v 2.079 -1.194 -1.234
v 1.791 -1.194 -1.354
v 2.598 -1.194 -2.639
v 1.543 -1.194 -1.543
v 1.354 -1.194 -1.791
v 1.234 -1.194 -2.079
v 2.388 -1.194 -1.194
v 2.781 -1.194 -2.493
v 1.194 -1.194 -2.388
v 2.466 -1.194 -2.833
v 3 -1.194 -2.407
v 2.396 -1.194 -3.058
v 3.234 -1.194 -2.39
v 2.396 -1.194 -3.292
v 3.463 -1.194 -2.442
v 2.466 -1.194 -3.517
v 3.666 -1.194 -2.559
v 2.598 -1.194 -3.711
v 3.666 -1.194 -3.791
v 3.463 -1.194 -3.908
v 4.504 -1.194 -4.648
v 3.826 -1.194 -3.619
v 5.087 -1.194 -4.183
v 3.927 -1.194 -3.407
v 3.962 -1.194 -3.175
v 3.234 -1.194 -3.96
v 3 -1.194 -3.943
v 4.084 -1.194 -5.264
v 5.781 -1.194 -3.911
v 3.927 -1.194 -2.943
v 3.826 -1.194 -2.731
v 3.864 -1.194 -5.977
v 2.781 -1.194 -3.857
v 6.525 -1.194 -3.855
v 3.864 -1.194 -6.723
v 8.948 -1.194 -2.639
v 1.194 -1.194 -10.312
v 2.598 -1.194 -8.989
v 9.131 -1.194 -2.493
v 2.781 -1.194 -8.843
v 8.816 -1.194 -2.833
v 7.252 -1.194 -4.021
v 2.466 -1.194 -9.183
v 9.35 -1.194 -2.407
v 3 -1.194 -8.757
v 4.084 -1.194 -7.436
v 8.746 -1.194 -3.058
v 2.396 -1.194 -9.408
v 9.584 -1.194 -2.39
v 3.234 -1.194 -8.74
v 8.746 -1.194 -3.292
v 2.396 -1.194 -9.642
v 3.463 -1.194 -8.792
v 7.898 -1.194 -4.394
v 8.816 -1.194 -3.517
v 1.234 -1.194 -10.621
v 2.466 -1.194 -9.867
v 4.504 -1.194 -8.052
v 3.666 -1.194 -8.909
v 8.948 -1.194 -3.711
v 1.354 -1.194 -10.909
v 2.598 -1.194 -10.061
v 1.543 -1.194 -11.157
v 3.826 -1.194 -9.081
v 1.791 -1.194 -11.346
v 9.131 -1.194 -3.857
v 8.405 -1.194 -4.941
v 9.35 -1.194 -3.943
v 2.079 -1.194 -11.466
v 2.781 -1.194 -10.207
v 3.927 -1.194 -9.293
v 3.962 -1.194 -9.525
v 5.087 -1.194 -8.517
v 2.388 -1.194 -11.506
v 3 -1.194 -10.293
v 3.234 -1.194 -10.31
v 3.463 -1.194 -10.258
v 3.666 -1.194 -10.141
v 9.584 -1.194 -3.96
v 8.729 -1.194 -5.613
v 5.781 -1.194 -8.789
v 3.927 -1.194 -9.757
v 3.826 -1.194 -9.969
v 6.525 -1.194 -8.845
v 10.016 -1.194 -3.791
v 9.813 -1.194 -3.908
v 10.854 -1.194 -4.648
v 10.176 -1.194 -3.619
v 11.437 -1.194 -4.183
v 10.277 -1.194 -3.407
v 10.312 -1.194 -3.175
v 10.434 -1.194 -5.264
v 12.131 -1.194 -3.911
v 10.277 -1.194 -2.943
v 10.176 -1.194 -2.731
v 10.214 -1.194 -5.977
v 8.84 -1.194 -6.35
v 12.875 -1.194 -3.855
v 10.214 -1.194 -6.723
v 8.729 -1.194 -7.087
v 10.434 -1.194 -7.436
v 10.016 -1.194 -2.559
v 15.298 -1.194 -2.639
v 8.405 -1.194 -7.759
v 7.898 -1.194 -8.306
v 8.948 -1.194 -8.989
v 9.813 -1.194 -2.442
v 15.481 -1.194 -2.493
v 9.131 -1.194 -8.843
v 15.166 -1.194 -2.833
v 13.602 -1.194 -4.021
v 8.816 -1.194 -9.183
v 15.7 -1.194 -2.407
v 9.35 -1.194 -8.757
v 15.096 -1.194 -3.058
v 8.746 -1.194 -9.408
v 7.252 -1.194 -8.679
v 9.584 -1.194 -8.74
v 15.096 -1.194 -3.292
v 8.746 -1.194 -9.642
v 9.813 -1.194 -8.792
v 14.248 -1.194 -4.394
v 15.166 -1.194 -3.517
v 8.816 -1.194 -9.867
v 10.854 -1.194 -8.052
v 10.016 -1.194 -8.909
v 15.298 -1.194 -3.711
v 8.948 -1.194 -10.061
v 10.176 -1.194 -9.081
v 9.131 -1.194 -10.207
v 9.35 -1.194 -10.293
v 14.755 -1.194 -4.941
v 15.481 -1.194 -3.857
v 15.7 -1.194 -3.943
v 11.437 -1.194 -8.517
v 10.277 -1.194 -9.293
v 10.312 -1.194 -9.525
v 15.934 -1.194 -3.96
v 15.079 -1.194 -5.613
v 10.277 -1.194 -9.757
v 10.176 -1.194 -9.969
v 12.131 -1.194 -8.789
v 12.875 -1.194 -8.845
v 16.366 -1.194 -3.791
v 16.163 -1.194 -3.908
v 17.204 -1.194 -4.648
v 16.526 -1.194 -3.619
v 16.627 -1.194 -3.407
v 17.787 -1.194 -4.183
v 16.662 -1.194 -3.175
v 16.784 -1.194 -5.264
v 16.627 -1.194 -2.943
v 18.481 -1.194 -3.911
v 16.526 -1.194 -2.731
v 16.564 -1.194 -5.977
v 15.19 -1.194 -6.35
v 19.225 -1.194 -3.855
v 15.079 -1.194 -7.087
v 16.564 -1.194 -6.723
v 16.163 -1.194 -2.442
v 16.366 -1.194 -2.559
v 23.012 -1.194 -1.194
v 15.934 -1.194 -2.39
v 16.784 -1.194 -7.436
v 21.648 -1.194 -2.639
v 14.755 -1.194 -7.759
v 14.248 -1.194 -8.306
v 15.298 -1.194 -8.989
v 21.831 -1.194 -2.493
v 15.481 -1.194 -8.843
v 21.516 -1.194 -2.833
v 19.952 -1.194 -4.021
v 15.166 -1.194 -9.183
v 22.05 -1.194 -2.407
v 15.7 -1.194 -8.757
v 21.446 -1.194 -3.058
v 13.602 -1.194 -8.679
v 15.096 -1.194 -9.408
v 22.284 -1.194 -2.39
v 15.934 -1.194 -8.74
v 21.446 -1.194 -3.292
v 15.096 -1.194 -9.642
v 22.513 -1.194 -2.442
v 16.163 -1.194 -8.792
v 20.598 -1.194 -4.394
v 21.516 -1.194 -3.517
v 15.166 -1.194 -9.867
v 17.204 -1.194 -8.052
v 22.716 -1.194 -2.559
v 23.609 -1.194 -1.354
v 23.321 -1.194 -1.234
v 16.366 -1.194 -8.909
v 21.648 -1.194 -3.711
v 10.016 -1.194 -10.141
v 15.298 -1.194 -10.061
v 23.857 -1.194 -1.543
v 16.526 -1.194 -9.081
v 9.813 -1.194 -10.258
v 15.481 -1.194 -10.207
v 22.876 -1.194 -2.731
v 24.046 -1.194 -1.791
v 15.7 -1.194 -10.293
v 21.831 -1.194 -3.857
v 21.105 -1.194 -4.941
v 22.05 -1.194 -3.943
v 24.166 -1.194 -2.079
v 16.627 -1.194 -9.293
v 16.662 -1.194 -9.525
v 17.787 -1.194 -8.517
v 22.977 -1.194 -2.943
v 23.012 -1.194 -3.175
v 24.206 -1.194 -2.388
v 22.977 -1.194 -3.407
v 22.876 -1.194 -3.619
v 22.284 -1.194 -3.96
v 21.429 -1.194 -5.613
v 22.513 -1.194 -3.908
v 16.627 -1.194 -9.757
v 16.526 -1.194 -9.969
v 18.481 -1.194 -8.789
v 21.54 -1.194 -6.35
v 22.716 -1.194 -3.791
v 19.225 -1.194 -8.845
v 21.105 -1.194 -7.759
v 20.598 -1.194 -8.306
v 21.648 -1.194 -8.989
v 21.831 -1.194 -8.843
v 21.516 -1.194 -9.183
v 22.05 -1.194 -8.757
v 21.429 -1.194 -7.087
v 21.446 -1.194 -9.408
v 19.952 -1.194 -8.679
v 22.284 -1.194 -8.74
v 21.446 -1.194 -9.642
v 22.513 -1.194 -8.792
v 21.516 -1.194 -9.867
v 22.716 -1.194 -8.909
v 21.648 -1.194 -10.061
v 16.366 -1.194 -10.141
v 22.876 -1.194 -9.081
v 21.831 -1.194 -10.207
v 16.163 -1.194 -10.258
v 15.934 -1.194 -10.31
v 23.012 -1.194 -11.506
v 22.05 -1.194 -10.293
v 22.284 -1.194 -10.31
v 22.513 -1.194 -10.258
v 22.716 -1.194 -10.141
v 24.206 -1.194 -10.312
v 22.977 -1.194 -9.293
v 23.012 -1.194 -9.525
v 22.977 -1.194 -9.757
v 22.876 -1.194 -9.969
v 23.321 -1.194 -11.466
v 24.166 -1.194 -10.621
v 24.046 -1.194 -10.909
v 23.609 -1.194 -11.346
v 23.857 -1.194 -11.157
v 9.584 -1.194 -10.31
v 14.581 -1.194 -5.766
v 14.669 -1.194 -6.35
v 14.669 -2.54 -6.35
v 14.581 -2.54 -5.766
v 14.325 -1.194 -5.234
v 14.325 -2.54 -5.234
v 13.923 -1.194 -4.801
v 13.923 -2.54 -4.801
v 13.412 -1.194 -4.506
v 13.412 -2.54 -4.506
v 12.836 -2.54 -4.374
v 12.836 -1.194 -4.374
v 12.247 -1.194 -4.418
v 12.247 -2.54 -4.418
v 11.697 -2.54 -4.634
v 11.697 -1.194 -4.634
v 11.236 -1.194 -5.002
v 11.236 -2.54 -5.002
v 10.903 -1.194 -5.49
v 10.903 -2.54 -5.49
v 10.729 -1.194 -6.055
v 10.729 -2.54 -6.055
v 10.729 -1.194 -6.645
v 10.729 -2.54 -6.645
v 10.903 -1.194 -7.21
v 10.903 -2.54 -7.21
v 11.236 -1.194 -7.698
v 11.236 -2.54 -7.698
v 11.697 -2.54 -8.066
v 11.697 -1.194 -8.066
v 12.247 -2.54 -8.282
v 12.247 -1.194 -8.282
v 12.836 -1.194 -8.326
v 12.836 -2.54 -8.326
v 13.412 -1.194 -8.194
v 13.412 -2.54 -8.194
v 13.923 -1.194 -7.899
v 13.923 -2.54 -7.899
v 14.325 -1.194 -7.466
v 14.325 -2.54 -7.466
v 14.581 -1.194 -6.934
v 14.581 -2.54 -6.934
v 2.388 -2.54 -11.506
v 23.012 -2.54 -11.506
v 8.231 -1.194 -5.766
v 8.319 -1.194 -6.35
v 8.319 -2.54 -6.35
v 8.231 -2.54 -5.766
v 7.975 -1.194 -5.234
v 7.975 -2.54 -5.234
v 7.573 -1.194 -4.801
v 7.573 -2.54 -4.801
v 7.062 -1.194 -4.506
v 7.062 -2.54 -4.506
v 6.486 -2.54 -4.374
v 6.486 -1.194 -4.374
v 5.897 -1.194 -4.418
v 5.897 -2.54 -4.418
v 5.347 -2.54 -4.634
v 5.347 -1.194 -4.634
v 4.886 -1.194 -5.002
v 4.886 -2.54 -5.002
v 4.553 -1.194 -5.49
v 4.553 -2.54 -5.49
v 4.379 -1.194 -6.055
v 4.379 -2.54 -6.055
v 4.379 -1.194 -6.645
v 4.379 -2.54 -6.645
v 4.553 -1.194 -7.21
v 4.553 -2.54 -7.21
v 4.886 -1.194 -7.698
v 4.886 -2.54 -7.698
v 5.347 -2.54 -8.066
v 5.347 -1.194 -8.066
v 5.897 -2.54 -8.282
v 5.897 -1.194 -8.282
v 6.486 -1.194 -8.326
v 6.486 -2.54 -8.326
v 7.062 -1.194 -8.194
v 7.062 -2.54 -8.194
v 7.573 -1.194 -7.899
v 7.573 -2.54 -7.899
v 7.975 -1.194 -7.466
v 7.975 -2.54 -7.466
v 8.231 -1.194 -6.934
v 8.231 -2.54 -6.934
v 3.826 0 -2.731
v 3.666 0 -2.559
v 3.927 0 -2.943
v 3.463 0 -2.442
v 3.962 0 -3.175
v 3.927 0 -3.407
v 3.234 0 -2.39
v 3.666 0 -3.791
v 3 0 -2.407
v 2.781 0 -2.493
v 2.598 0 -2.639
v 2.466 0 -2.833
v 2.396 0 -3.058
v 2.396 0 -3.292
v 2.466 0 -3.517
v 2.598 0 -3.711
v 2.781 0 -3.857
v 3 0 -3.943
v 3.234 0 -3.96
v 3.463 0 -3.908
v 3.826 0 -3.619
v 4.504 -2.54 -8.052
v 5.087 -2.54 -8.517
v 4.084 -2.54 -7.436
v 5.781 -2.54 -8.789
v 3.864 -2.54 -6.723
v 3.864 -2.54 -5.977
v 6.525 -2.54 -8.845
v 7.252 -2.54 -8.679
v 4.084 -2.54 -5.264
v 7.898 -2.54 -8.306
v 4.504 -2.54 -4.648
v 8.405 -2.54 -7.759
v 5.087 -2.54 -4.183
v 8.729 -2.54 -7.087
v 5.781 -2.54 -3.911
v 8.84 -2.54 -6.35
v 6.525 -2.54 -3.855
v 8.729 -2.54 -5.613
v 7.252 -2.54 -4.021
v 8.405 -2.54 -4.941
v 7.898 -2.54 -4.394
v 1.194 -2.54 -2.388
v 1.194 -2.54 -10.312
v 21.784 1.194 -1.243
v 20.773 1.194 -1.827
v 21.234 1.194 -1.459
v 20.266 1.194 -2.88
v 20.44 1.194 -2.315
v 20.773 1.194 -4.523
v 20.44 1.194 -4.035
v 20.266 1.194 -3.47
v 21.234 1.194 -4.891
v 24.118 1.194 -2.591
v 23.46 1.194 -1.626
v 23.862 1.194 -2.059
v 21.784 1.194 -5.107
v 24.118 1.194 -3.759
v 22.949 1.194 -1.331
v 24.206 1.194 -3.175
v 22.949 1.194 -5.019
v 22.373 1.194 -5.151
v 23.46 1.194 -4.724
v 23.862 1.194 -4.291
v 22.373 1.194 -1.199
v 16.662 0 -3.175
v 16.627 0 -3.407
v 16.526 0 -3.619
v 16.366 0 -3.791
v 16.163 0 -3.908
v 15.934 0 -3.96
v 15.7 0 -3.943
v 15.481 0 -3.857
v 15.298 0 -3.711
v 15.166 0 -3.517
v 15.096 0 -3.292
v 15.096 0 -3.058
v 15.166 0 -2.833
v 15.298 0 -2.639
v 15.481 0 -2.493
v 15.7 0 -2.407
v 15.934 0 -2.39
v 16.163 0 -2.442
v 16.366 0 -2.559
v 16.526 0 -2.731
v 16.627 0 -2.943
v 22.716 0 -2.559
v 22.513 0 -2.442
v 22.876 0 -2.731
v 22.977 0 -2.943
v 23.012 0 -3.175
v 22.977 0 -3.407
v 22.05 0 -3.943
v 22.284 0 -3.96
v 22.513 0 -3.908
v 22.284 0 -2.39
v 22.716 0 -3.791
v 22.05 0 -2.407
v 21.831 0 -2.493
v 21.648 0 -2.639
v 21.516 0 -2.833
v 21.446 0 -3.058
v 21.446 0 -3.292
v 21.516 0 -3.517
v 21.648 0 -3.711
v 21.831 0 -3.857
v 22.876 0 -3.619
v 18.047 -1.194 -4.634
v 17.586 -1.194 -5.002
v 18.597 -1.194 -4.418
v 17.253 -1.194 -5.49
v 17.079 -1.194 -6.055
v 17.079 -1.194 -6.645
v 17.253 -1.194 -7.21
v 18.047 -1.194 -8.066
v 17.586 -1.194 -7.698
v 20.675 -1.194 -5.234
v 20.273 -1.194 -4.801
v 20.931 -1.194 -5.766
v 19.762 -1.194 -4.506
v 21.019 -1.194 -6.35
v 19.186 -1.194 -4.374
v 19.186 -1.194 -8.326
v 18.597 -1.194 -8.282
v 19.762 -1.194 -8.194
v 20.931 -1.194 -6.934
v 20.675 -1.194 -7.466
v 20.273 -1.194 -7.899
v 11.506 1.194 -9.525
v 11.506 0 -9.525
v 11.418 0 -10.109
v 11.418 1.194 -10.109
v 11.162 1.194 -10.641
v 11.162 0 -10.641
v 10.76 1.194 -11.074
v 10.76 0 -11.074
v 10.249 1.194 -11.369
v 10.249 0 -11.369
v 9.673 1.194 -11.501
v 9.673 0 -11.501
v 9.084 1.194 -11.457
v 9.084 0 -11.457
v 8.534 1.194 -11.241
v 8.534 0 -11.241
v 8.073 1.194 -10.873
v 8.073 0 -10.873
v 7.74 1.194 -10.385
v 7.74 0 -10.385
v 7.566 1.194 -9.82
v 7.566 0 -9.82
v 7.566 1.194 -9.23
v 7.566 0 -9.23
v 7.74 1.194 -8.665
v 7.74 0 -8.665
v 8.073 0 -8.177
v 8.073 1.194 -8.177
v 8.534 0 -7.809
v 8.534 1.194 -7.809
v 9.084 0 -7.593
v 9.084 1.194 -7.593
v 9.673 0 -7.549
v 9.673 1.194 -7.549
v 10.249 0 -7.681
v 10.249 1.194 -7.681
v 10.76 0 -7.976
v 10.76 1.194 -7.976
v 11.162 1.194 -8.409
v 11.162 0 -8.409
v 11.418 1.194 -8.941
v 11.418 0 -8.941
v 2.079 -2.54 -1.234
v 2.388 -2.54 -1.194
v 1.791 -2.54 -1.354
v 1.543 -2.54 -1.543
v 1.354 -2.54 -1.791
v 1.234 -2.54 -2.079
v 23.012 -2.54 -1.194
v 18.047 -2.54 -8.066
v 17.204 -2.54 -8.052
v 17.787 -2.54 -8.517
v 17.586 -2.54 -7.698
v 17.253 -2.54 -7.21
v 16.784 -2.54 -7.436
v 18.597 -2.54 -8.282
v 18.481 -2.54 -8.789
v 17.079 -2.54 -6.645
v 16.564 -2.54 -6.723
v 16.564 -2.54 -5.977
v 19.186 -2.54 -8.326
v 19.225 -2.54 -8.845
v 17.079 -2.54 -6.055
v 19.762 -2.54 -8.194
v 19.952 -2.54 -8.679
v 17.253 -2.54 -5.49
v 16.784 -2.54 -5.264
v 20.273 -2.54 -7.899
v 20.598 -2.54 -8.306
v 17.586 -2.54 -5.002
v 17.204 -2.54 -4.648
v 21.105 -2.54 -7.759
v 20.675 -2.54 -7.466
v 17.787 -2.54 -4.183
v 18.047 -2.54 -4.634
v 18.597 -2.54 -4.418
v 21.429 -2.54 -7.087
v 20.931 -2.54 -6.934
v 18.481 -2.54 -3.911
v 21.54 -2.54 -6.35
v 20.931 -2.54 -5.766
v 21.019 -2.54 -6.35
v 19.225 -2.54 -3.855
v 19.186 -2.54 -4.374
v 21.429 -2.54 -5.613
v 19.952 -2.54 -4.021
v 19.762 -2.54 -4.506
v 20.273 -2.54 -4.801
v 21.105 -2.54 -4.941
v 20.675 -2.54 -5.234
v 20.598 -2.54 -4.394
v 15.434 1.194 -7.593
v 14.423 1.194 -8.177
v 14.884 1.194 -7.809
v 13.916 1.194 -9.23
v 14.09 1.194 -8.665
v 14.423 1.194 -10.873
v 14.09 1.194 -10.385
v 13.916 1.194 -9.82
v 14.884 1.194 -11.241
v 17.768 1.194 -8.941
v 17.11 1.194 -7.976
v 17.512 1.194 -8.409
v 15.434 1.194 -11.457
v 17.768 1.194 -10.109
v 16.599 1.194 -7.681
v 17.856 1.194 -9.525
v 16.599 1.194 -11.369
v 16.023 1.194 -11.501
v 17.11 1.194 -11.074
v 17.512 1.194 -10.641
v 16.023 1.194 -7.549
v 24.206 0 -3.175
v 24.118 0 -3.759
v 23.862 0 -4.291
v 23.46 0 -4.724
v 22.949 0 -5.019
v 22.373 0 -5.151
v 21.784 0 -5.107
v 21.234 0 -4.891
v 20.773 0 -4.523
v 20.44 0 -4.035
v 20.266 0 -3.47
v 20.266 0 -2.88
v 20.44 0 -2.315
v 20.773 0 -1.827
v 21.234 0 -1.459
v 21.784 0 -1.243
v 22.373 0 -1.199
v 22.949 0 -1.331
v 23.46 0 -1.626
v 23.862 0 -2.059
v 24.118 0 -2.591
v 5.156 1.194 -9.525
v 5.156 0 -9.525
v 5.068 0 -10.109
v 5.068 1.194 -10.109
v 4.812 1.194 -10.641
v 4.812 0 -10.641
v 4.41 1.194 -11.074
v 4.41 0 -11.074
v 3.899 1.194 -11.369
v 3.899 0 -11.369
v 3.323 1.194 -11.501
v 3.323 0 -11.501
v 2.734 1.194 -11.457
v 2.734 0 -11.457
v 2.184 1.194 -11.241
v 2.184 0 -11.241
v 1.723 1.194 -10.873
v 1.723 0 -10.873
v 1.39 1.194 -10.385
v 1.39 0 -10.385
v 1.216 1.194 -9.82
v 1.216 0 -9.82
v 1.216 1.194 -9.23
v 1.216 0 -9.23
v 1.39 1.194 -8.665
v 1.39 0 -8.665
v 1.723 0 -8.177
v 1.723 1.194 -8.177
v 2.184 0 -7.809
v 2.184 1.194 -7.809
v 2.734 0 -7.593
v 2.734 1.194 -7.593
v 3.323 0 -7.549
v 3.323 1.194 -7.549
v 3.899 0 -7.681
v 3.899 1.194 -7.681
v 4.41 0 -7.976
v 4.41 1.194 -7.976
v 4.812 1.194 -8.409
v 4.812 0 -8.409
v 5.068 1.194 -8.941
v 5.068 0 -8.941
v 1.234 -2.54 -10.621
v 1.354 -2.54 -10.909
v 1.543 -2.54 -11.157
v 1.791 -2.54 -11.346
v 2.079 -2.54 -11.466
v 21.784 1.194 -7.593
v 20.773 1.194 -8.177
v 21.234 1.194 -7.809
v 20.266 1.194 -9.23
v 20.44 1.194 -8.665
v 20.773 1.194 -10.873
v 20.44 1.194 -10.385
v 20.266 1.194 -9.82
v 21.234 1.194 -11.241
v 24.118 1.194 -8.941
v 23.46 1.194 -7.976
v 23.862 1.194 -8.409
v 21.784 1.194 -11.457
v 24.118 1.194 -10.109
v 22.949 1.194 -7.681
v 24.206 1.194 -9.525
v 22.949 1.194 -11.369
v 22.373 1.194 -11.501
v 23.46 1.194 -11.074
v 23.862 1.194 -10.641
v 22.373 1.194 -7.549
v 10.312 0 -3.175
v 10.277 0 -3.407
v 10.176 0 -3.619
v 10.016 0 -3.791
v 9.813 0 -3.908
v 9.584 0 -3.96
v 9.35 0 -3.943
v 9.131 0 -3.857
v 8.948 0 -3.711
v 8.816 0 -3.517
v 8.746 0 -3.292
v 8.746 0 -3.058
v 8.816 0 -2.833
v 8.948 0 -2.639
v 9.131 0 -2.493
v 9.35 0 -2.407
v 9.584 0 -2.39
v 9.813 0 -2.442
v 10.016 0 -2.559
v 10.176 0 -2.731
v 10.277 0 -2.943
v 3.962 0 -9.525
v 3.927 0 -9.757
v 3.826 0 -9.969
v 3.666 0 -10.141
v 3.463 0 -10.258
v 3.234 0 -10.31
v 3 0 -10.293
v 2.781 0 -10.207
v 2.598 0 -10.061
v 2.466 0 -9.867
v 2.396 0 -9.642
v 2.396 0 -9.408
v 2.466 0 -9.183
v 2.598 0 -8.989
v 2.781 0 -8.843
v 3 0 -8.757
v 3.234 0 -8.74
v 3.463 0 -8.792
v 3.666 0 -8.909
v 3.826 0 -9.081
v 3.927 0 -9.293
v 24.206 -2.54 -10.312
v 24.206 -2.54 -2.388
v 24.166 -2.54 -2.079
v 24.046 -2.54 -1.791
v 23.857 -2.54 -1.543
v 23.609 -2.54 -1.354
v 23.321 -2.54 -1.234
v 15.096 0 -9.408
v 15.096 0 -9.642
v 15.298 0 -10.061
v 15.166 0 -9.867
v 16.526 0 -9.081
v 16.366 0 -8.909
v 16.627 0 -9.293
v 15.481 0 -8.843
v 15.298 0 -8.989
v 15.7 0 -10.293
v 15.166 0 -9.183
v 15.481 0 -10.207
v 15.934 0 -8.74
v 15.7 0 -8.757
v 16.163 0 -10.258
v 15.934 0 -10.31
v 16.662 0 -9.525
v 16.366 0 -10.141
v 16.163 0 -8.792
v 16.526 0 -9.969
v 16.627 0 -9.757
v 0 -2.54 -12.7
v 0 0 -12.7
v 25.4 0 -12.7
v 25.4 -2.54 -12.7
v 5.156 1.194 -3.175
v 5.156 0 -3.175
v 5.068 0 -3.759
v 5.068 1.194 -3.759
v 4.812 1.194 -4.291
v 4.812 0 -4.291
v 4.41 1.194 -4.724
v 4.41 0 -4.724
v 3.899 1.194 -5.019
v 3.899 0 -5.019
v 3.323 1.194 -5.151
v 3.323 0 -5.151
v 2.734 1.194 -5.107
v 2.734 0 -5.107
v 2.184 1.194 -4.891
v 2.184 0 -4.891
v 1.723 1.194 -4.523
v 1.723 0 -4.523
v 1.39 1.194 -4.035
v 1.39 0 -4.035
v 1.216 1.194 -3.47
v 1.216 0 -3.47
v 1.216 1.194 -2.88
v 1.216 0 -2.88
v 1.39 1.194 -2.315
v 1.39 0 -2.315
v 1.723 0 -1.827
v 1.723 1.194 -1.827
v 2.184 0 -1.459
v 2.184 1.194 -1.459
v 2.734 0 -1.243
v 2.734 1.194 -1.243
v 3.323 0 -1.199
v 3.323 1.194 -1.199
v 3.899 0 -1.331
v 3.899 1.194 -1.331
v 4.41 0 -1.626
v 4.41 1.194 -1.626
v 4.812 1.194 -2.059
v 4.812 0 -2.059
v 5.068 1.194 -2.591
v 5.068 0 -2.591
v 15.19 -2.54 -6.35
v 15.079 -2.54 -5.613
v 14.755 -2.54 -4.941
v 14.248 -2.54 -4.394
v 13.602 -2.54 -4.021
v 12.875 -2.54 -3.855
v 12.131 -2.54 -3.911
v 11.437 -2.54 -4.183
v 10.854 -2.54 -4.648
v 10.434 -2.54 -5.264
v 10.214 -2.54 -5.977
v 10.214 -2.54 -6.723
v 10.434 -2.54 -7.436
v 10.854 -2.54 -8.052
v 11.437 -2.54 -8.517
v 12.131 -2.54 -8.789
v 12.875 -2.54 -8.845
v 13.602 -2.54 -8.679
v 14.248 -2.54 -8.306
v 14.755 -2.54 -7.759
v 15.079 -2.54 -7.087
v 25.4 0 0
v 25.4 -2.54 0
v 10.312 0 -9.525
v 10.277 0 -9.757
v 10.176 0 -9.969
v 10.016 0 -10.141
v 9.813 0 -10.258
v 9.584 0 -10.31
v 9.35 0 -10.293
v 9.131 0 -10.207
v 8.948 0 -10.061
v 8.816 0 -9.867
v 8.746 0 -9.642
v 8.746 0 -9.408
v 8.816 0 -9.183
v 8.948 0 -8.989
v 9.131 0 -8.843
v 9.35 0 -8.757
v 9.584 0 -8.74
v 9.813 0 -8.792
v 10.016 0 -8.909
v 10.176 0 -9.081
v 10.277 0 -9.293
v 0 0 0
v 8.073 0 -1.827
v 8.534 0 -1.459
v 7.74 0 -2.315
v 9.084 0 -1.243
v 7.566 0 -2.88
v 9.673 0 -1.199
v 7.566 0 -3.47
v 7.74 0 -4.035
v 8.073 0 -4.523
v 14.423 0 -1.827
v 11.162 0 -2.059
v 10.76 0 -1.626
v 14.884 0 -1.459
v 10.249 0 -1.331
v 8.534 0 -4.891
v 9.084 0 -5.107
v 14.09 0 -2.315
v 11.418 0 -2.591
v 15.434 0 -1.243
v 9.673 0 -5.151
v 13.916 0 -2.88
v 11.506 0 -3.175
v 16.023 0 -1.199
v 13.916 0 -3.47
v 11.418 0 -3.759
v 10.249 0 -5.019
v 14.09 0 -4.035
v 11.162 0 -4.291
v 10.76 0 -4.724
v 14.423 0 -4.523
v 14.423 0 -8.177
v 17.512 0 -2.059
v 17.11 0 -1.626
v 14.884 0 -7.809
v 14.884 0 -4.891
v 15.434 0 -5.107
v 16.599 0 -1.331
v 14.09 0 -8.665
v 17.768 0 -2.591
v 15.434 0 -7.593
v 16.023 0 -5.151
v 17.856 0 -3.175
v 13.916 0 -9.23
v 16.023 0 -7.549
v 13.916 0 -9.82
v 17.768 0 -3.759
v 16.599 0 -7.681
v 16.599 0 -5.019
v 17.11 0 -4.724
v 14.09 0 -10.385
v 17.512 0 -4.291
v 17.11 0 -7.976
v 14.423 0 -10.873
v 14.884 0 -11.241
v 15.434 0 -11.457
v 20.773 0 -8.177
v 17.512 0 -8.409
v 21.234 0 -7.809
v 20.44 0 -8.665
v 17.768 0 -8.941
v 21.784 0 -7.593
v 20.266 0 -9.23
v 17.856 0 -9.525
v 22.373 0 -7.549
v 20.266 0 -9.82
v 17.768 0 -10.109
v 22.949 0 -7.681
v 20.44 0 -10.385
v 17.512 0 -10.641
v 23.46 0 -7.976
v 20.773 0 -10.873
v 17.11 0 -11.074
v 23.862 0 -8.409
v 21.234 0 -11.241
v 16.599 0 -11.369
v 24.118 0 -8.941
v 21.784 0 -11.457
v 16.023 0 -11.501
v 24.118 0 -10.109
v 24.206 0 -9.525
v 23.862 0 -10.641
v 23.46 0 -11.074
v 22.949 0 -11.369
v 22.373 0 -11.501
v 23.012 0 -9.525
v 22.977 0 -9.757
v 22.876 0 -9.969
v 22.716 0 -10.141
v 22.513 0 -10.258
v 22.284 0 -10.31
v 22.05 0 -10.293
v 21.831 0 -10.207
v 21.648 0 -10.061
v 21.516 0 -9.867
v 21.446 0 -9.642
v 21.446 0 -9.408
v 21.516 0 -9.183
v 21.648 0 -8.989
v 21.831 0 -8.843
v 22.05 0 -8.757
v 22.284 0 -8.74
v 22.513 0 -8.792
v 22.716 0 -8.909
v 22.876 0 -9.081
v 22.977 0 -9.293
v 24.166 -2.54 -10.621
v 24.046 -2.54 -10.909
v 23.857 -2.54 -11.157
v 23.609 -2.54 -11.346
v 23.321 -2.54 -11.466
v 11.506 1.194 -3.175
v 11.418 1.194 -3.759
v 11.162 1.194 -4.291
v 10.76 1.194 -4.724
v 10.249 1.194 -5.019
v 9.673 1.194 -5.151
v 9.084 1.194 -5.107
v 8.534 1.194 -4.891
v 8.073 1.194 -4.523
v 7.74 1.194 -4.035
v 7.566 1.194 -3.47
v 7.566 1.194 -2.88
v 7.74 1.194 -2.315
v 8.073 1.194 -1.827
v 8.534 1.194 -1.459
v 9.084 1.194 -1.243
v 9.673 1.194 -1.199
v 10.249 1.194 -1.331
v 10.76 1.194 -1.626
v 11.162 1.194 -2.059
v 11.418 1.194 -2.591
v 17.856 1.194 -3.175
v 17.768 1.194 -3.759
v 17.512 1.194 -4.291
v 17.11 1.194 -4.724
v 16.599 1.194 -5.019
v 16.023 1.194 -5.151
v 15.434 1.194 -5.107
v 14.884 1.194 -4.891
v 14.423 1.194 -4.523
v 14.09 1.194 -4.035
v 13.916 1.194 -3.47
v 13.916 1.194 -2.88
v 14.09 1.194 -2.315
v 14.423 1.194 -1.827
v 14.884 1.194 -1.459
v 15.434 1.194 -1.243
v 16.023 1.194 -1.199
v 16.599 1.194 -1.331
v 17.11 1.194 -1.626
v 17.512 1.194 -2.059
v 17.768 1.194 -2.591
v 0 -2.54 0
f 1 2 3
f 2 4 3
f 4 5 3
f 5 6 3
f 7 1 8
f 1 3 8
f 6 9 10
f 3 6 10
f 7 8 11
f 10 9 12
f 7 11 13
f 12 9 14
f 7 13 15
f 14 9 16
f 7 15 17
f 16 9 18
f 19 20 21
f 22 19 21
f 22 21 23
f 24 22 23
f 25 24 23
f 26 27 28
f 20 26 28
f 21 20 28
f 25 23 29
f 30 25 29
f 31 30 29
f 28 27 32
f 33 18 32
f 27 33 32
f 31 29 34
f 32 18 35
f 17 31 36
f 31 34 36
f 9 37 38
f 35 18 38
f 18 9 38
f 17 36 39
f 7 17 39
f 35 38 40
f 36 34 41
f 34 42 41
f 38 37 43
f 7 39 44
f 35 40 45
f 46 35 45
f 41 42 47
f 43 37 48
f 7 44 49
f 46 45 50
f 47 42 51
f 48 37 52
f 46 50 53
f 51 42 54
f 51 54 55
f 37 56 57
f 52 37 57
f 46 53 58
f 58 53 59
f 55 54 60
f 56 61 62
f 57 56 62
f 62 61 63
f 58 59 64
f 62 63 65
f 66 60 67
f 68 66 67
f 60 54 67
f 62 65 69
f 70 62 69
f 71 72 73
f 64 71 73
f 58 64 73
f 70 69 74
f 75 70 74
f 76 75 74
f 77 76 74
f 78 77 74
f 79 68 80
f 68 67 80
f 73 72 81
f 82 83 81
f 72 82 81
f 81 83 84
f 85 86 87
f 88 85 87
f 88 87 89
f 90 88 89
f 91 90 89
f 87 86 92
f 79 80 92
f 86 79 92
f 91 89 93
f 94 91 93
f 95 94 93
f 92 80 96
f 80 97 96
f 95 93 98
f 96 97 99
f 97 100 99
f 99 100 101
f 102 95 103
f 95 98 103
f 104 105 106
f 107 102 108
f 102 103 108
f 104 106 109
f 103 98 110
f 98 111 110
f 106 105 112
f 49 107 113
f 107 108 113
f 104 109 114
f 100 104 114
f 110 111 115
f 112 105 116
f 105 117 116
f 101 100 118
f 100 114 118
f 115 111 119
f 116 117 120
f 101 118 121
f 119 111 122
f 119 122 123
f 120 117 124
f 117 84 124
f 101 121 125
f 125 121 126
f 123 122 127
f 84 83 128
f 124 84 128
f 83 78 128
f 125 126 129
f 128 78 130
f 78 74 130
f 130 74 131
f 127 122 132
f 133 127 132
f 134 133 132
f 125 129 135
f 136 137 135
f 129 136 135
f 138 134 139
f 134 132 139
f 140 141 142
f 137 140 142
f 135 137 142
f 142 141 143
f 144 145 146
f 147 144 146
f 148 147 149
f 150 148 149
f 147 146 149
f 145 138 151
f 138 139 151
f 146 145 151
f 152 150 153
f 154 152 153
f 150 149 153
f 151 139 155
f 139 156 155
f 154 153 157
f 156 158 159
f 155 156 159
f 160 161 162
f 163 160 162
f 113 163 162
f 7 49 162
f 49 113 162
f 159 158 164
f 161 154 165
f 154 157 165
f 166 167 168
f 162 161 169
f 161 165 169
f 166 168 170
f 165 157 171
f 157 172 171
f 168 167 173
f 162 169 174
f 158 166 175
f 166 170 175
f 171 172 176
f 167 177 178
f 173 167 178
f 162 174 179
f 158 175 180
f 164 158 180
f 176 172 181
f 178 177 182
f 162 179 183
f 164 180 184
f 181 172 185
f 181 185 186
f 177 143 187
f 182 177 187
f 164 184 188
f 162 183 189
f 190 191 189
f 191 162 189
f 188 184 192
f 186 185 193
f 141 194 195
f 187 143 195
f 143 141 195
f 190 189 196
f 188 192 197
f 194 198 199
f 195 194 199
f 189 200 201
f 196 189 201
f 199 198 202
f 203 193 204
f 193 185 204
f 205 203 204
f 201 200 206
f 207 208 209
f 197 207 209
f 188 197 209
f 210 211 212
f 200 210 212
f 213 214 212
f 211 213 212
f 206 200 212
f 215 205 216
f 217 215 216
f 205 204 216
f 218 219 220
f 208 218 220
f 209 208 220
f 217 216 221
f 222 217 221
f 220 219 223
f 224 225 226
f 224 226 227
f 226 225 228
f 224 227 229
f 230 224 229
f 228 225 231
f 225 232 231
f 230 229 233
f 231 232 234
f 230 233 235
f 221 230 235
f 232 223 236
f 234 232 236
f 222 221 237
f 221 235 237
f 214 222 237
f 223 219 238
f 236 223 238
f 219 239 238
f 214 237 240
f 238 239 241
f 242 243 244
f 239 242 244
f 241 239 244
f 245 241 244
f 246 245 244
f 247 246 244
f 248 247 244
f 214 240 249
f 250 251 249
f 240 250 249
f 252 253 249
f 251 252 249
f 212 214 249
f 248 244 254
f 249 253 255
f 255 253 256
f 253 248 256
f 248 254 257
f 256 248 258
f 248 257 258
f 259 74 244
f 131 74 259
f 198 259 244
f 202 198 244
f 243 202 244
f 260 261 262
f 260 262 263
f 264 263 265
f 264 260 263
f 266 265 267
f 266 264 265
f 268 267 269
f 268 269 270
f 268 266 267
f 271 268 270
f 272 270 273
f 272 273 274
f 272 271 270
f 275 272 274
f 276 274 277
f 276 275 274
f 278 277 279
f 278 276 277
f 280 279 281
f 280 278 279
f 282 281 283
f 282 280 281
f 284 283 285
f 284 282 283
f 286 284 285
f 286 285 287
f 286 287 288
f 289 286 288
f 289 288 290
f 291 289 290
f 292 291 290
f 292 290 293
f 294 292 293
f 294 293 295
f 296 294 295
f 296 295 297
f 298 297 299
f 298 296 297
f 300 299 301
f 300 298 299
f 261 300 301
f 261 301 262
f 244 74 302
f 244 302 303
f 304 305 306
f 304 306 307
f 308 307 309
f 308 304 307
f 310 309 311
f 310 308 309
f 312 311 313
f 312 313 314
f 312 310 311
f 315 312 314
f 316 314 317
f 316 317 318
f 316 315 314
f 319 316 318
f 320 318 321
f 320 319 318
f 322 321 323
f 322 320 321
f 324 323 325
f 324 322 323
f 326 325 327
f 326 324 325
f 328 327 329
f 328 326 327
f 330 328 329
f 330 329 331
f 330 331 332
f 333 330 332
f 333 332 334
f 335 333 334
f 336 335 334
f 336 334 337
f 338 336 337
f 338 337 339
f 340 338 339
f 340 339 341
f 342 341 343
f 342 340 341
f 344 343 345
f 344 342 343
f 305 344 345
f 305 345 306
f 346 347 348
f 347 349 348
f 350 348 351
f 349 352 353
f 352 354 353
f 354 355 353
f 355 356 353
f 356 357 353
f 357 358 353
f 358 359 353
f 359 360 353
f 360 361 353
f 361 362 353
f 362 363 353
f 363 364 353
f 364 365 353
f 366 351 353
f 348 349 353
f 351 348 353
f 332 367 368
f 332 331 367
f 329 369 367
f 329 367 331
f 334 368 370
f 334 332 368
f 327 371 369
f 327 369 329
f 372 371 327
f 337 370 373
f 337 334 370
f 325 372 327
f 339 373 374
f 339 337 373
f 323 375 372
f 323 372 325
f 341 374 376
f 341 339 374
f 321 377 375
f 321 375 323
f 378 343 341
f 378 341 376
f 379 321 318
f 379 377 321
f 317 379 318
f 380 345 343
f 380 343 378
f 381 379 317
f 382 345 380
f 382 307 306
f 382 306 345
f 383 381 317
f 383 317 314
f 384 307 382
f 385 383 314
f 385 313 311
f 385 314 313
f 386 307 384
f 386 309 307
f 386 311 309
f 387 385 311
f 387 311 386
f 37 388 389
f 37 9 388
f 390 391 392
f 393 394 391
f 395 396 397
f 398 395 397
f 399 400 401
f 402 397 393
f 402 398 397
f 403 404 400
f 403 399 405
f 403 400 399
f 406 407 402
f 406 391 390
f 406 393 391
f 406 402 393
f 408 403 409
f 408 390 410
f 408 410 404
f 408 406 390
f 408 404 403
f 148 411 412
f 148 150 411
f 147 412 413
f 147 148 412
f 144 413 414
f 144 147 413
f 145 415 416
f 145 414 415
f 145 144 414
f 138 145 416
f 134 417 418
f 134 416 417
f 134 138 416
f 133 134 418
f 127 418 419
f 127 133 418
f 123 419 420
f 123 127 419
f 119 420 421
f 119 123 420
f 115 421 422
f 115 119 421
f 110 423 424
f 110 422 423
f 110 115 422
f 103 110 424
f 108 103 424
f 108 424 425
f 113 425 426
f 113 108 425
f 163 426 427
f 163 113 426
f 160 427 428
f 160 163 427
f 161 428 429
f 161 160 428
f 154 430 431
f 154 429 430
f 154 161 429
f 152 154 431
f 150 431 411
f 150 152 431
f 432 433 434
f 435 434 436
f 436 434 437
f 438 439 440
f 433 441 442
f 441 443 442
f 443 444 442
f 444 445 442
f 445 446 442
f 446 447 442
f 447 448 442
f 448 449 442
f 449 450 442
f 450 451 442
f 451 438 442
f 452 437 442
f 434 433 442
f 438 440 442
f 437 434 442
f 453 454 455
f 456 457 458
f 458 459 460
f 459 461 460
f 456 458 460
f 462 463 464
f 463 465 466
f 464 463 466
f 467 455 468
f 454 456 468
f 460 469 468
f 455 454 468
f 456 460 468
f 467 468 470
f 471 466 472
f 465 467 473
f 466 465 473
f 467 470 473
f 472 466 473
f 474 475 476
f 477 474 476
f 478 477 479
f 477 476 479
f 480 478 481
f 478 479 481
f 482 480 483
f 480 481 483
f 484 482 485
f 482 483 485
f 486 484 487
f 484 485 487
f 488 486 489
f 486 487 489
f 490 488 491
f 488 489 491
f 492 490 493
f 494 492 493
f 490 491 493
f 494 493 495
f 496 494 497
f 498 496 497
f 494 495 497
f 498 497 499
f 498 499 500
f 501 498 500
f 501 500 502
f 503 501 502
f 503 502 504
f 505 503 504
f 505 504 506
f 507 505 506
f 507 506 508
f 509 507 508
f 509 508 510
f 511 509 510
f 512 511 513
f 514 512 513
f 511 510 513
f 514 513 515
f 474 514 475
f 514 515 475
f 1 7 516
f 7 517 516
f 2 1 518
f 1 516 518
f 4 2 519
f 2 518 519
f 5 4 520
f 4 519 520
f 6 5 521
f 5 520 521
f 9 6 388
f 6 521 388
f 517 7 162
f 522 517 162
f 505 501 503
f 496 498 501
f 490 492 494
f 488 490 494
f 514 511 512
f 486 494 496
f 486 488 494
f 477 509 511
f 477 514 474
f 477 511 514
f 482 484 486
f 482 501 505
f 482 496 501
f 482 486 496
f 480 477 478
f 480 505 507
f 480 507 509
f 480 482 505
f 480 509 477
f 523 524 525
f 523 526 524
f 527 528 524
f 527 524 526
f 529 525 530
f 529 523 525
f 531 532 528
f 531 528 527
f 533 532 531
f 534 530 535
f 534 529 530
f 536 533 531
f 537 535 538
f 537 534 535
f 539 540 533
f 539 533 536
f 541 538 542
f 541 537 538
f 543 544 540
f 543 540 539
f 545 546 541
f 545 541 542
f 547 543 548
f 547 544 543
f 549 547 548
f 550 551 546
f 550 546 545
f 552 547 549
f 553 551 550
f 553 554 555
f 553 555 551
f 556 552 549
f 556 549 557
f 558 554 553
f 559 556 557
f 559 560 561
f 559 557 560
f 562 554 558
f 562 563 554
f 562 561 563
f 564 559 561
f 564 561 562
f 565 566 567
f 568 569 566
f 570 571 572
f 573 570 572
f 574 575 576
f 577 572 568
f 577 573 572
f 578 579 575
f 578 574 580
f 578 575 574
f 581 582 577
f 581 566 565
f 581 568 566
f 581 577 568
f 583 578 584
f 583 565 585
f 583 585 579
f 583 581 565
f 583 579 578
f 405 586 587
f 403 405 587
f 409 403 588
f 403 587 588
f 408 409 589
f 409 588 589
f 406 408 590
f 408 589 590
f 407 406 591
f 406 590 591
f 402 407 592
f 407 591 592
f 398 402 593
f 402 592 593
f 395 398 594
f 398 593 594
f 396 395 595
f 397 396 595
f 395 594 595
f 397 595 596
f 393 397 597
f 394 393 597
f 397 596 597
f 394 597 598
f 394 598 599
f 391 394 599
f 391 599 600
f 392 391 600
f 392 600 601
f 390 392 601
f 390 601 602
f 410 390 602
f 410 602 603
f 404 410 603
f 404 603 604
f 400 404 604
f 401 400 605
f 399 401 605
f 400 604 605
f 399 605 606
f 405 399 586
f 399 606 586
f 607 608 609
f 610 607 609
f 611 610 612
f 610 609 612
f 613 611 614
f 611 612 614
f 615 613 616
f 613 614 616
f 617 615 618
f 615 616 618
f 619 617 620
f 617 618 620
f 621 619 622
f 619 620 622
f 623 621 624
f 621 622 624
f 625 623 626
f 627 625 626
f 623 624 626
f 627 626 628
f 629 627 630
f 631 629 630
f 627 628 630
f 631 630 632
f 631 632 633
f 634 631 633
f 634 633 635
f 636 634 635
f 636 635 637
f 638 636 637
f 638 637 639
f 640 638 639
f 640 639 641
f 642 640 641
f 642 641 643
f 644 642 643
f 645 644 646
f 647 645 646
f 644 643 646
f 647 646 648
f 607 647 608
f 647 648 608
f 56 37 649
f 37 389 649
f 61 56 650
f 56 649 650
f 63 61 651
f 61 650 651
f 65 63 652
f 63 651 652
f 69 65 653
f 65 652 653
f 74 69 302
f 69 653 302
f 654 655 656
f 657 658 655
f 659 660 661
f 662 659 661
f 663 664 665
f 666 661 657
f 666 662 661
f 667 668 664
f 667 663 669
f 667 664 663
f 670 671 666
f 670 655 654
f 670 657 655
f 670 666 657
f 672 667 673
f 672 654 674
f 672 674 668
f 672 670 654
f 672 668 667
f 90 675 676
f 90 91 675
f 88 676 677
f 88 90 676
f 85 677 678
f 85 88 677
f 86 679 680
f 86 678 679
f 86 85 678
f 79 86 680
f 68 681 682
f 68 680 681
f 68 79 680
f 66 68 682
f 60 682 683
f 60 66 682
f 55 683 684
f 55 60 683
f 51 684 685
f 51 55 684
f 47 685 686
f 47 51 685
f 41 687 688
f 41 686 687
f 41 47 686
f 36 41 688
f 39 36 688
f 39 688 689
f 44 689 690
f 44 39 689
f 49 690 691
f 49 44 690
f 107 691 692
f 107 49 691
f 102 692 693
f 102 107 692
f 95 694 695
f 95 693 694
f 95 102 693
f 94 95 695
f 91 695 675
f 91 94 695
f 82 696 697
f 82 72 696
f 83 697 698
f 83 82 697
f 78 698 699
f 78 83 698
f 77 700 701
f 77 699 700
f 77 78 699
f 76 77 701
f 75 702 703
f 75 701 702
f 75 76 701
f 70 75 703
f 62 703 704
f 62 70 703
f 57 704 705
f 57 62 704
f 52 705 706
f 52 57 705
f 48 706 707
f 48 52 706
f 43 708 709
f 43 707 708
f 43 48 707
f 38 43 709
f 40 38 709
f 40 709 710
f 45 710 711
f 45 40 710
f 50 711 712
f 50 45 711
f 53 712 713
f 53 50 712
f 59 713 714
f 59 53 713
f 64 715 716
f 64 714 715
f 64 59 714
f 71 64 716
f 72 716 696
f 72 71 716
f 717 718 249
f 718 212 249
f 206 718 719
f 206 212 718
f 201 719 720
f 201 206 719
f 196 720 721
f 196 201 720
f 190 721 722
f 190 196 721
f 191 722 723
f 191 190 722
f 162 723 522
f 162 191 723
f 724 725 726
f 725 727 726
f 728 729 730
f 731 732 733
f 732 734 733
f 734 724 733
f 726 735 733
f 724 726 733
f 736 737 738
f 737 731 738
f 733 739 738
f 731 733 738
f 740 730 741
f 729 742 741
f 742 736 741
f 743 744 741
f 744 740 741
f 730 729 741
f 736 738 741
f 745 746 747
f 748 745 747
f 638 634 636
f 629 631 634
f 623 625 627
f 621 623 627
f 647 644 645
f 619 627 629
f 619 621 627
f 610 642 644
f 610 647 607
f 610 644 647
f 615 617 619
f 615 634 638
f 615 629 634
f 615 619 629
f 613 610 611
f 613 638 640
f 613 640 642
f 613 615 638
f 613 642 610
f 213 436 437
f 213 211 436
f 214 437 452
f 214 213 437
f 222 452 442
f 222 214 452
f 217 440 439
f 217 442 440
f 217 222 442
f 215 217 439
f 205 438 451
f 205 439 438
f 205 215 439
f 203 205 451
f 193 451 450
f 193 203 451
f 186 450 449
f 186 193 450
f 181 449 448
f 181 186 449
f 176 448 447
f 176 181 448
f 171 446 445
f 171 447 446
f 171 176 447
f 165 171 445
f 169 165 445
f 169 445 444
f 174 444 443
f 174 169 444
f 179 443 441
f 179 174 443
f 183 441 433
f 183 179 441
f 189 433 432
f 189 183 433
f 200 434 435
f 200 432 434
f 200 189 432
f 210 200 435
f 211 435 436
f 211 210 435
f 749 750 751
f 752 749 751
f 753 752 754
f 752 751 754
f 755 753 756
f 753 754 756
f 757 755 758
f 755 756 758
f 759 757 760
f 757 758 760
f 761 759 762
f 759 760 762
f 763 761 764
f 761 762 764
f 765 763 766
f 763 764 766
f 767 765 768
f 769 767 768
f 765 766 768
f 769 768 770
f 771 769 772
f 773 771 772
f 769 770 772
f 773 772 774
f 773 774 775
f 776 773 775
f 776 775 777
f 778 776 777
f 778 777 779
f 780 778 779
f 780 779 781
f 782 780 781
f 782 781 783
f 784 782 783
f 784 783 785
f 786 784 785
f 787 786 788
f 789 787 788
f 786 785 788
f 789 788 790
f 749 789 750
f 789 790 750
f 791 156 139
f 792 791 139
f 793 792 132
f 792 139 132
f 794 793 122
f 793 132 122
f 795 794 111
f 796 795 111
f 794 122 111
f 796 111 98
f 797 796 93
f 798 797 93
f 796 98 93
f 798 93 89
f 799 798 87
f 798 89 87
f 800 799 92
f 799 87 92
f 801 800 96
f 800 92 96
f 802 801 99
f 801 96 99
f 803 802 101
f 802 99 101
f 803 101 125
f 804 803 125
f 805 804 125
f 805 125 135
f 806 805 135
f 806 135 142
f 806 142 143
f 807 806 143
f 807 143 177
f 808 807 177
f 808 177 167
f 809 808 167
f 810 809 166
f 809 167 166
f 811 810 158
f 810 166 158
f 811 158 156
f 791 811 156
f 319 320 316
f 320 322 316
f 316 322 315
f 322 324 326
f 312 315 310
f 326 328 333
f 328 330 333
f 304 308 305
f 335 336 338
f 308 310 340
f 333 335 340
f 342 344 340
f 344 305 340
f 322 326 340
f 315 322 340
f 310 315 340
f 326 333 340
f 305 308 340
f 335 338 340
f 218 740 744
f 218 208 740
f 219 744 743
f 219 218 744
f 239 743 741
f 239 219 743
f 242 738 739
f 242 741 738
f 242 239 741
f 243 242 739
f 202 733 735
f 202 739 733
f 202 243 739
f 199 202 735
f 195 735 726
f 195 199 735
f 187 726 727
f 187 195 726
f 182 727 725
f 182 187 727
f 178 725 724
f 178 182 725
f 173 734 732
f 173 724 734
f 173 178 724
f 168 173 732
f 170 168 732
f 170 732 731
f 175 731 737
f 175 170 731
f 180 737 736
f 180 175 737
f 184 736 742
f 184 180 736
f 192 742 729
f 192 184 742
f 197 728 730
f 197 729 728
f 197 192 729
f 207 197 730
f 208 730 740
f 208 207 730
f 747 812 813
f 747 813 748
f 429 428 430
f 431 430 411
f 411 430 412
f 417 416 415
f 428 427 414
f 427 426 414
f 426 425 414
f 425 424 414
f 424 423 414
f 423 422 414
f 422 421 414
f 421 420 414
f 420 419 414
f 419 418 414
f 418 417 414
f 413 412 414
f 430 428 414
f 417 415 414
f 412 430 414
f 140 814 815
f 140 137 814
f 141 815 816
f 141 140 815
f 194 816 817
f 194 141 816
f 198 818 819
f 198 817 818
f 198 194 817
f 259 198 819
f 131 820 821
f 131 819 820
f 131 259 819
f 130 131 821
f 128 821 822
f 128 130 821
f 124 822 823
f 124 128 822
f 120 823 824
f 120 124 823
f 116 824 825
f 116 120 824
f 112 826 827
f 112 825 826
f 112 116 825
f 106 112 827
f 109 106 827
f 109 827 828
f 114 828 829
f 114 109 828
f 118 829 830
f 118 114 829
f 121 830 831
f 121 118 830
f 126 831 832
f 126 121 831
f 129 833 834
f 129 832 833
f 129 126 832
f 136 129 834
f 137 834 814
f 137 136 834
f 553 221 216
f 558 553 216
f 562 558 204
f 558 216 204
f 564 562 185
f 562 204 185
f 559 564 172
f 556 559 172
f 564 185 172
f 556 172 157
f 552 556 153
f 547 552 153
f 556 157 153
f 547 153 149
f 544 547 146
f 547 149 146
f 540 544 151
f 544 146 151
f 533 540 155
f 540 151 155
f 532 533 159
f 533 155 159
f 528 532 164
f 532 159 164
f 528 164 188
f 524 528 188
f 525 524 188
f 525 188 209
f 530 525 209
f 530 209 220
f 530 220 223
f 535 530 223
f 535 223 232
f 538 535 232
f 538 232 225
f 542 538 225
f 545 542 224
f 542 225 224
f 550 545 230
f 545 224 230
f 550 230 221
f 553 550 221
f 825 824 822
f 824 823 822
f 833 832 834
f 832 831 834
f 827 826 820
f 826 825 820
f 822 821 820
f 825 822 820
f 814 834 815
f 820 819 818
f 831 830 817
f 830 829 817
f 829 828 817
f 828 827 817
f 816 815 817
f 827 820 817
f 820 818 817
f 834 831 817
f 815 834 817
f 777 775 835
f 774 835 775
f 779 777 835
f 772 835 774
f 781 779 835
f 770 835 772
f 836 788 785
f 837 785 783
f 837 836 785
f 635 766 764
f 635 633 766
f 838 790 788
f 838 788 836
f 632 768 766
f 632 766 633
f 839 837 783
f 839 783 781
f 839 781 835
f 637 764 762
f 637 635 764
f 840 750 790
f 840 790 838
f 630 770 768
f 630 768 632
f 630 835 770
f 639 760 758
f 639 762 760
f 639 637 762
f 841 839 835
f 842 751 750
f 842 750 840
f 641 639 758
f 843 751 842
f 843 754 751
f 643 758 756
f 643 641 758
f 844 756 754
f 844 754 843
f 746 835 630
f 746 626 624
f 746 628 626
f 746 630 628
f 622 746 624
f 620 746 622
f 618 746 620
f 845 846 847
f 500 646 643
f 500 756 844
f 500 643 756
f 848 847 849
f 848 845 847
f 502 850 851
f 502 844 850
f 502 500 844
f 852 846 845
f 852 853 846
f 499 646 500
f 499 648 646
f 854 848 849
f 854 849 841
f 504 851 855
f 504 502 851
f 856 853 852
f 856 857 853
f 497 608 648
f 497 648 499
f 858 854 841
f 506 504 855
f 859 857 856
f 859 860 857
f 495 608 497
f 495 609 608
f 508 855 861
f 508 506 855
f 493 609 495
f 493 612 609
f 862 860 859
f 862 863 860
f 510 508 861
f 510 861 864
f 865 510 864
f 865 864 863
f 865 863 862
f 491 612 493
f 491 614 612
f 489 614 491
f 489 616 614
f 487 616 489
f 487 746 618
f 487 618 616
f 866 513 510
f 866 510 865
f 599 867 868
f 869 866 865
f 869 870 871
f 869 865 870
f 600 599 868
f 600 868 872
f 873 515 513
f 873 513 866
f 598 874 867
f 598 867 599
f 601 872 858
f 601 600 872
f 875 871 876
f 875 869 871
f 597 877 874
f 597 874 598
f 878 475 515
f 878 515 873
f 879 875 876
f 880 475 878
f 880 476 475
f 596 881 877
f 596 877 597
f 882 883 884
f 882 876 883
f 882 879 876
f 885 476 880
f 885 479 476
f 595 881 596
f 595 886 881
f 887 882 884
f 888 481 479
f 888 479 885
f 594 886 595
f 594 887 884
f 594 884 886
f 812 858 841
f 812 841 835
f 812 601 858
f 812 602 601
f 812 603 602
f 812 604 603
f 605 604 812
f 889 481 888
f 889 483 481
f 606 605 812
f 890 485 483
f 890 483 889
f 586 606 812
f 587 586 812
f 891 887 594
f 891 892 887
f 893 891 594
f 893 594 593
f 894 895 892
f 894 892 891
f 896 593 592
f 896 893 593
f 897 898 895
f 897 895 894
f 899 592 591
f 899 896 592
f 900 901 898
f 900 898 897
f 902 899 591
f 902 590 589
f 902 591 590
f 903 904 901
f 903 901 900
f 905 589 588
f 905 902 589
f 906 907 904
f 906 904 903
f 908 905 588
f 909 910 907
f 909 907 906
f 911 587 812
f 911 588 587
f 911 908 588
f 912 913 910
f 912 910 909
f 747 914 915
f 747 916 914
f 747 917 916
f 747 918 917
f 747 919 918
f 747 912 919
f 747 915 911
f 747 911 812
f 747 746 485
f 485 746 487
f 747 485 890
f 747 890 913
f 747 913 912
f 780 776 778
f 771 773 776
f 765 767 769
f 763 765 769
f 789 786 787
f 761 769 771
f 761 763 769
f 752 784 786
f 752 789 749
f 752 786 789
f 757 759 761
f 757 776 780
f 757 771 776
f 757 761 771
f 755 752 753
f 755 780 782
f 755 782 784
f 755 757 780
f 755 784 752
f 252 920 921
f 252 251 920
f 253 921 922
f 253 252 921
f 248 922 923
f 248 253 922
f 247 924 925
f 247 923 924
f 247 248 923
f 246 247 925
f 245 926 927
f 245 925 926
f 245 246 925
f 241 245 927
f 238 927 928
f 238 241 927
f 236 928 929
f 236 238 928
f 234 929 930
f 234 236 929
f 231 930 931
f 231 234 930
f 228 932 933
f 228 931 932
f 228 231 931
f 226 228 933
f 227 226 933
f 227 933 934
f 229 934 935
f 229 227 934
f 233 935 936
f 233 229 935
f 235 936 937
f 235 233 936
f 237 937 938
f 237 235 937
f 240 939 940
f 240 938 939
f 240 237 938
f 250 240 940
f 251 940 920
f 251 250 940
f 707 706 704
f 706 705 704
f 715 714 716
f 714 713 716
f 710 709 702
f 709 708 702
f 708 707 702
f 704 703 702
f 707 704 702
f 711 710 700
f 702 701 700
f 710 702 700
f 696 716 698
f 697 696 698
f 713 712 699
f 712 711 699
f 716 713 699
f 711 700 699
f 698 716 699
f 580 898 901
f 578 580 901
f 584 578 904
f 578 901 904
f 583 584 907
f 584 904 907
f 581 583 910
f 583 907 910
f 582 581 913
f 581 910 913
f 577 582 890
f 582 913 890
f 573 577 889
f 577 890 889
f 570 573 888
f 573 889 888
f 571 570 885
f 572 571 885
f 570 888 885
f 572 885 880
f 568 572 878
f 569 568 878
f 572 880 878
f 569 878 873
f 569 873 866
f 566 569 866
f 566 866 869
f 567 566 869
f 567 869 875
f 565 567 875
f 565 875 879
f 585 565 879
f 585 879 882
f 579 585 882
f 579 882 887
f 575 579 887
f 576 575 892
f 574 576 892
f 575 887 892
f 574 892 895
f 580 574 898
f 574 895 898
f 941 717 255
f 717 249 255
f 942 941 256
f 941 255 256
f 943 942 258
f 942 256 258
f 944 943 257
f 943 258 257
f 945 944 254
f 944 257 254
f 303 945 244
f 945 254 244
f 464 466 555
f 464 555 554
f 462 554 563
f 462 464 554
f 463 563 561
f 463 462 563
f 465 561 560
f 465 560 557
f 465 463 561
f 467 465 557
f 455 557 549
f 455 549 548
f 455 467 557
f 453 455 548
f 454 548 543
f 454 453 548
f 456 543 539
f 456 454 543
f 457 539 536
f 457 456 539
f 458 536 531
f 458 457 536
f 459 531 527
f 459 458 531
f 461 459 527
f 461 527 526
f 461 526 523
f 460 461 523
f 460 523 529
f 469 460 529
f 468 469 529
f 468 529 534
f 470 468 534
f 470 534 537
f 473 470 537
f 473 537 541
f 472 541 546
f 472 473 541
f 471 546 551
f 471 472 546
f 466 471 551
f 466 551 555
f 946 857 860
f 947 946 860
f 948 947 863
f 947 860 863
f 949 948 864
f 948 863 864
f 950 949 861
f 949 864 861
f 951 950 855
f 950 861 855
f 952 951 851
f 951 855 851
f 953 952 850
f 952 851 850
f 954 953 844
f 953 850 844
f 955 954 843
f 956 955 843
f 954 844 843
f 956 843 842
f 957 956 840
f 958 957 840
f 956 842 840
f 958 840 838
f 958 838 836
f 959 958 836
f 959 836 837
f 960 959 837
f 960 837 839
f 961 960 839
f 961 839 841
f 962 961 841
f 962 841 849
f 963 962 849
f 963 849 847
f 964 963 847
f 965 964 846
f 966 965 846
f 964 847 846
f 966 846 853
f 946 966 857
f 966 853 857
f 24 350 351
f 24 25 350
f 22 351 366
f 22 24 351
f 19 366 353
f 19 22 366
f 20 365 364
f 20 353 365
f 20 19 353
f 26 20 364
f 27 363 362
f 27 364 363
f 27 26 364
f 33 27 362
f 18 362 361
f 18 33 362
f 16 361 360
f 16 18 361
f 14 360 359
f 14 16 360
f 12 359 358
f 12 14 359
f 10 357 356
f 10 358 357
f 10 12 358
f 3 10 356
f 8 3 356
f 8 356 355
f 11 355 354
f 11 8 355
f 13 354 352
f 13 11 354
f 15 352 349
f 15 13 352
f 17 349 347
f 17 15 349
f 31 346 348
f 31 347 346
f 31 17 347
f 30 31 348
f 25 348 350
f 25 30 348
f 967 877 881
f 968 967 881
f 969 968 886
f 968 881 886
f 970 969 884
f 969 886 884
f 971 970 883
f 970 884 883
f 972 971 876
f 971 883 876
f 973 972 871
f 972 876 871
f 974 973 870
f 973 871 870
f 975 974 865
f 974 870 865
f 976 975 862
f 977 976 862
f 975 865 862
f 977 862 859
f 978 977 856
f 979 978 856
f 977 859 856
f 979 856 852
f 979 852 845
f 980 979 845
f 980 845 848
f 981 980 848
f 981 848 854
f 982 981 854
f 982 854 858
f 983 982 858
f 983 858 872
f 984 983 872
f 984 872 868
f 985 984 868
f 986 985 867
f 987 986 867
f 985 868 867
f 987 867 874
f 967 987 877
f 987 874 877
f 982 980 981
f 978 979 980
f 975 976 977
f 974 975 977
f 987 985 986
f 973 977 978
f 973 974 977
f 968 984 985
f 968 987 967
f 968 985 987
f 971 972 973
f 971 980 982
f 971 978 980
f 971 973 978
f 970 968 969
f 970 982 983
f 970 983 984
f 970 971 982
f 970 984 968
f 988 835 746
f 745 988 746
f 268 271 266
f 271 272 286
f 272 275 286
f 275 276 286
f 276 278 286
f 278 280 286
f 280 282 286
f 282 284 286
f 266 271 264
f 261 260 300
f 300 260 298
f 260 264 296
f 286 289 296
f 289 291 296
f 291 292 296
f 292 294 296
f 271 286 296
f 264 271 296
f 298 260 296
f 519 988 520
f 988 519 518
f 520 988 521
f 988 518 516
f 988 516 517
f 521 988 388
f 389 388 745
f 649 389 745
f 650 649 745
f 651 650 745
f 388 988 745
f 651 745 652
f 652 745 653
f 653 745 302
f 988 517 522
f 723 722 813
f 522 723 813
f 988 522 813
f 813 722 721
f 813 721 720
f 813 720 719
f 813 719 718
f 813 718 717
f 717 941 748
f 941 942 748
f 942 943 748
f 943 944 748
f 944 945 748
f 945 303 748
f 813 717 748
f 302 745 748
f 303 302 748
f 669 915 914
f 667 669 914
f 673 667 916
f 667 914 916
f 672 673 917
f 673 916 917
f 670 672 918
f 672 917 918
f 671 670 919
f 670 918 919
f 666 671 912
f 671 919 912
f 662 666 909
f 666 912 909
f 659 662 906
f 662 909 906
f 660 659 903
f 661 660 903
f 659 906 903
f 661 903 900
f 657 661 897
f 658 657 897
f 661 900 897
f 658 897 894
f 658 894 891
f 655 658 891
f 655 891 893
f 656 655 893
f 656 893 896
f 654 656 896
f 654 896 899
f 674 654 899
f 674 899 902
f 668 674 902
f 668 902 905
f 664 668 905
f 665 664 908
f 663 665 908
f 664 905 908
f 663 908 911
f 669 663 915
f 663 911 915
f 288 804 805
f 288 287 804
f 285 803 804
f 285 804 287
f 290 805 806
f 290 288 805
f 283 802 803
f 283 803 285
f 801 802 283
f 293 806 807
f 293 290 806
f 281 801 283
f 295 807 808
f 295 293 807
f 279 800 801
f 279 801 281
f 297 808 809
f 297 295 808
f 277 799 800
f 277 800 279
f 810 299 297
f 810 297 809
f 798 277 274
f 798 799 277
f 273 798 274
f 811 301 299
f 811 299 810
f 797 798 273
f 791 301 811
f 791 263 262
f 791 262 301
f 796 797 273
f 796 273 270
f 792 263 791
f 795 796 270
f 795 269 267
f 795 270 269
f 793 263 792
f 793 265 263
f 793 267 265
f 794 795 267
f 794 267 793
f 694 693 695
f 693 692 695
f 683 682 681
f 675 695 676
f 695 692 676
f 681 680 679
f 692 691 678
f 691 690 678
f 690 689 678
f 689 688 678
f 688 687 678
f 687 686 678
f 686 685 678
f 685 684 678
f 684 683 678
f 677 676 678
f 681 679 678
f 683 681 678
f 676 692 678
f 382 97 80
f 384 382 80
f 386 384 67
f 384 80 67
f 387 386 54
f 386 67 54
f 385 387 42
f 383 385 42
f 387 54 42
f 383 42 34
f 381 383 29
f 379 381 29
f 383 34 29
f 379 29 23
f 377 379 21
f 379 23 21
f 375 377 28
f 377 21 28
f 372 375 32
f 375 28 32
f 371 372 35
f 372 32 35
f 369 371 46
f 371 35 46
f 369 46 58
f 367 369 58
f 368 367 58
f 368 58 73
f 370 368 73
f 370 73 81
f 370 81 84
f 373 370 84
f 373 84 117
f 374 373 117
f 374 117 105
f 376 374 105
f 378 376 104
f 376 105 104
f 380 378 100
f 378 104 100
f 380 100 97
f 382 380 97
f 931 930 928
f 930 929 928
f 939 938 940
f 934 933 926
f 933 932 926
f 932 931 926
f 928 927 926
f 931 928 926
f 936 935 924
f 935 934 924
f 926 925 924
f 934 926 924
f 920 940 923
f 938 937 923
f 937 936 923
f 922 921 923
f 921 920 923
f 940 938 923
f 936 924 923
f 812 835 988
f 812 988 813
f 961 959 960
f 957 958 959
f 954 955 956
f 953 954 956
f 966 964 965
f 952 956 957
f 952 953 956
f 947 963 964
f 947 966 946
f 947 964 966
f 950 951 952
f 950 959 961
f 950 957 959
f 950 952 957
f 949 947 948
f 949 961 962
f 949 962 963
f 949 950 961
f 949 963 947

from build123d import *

# Parameters (mm, degrees)
SKETCH1_W            = 25.4
SKETCH1_H            = 12.7
BOSS_EXTRUDE1_DEPTH  = 2.54
SKETCH1_3_R          = 1.9812
BOSS_EXTRUDE2_DEPTH  = 1.1938
LPATTERN1_COUNT      = 4
LPATTERN1_PITCH      = 6.35
LPATTERN1_COUNT_DIR2 = 2
LPATTERN1_PITCH_DIR2 = 6.35
SHELL1_T             = -1.1938
SKETCH2_R            = 2.5019
SKETCH2_R_2          = 1.9812
BOSS_EXTRUDE3_DEPTH  = 1.3462
LPATTERN2_COUNT      = 3
LPATTERN2_PITCH      = 6.35
FILLET1_R            = 1.1938


with BuildPart() as part:
    # Sketch1 → Boss-Extrude1 (new body)
    with BuildSketch(Plane(origin=(0, 0, 0), x_dir=(1, 0, 0), z_dir=(0, 1, 0))):
        with Locations((12.7, 6.35)):
            Rectangle(SKETCH1_W, SKETCH1_H)
    extrude(amount=-BOSS_EXTRUDE1_DEPTH)

    # Sketch1<3> → Boss-Extrude2 (add)
    with BuildSketch(Plane(origin=(0, 0, 0), x_dir=(1, 0, 0), z_dir=(0, 1, 0))):
        with Locations((3.175, 9.525)):
            Circle(SKETCH1_3_R)
    boss_extrude2 = extrude(amount=BOSS_EXTRUDE2_DEPTH)

    # LPattern1: Boss-Extrude2 4 × 2
    with Locations(*[(i * LPATTERN1_PITCH, 0, j * LPATTERN1_PITCH_DIR2) for i in range(LPATTERN1_COUNT) for j in range(LPATTERN1_COUNT_DIR2) if (i, j) != (0, 0)]):
        add(boss_extrude2)

    # Shell1
    shell1_openings = [part.faces().sort_by_distance(p)[0] for p in [
        (12.7, -2.54, -6.35),
    ]]
    offset(amount=SHELL1_T, openings=shell1_openings, kind=Kind.INTERSECTION)

    # Sketch2 → Boss-Extrude3 (add)
    with BuildSketch(Plane.XZ.offset(1.1938)):
        with Locations((6.337930238, -6.35)):
            Circle(SKETCH2_R)
        with Locations((6.337930238, -6.35)):
            Circle(SKETCH2_R_2, mode=Mode.SUBTRACT)
    boss_extrude3 = extrude(amount=BOSS_EXTRUDE3_DEPTH)

    # LPattern2: Boss-Extrude3 ×3
    with Locations(*[(i * LPATTERN2_PITCH, 0, 0) for i in range(1, LPATTERN2_COUNT)]):
        add(boss_extrude3)

    # Fillet1
    fillet1_edges = [part.edges().sort_by_distance(p)[0] for p in [
        (1.1938, -1.8669, -1.1938),
        (1.1938, -1.8669, -11.5062),
        (24.2062, -1.8669, -11.5062),
        (24.2062, -1.8669, -1.1938),
    ]]
    fillet(fillet1_edges, radius=FILLET1_R)


solid = part.part
